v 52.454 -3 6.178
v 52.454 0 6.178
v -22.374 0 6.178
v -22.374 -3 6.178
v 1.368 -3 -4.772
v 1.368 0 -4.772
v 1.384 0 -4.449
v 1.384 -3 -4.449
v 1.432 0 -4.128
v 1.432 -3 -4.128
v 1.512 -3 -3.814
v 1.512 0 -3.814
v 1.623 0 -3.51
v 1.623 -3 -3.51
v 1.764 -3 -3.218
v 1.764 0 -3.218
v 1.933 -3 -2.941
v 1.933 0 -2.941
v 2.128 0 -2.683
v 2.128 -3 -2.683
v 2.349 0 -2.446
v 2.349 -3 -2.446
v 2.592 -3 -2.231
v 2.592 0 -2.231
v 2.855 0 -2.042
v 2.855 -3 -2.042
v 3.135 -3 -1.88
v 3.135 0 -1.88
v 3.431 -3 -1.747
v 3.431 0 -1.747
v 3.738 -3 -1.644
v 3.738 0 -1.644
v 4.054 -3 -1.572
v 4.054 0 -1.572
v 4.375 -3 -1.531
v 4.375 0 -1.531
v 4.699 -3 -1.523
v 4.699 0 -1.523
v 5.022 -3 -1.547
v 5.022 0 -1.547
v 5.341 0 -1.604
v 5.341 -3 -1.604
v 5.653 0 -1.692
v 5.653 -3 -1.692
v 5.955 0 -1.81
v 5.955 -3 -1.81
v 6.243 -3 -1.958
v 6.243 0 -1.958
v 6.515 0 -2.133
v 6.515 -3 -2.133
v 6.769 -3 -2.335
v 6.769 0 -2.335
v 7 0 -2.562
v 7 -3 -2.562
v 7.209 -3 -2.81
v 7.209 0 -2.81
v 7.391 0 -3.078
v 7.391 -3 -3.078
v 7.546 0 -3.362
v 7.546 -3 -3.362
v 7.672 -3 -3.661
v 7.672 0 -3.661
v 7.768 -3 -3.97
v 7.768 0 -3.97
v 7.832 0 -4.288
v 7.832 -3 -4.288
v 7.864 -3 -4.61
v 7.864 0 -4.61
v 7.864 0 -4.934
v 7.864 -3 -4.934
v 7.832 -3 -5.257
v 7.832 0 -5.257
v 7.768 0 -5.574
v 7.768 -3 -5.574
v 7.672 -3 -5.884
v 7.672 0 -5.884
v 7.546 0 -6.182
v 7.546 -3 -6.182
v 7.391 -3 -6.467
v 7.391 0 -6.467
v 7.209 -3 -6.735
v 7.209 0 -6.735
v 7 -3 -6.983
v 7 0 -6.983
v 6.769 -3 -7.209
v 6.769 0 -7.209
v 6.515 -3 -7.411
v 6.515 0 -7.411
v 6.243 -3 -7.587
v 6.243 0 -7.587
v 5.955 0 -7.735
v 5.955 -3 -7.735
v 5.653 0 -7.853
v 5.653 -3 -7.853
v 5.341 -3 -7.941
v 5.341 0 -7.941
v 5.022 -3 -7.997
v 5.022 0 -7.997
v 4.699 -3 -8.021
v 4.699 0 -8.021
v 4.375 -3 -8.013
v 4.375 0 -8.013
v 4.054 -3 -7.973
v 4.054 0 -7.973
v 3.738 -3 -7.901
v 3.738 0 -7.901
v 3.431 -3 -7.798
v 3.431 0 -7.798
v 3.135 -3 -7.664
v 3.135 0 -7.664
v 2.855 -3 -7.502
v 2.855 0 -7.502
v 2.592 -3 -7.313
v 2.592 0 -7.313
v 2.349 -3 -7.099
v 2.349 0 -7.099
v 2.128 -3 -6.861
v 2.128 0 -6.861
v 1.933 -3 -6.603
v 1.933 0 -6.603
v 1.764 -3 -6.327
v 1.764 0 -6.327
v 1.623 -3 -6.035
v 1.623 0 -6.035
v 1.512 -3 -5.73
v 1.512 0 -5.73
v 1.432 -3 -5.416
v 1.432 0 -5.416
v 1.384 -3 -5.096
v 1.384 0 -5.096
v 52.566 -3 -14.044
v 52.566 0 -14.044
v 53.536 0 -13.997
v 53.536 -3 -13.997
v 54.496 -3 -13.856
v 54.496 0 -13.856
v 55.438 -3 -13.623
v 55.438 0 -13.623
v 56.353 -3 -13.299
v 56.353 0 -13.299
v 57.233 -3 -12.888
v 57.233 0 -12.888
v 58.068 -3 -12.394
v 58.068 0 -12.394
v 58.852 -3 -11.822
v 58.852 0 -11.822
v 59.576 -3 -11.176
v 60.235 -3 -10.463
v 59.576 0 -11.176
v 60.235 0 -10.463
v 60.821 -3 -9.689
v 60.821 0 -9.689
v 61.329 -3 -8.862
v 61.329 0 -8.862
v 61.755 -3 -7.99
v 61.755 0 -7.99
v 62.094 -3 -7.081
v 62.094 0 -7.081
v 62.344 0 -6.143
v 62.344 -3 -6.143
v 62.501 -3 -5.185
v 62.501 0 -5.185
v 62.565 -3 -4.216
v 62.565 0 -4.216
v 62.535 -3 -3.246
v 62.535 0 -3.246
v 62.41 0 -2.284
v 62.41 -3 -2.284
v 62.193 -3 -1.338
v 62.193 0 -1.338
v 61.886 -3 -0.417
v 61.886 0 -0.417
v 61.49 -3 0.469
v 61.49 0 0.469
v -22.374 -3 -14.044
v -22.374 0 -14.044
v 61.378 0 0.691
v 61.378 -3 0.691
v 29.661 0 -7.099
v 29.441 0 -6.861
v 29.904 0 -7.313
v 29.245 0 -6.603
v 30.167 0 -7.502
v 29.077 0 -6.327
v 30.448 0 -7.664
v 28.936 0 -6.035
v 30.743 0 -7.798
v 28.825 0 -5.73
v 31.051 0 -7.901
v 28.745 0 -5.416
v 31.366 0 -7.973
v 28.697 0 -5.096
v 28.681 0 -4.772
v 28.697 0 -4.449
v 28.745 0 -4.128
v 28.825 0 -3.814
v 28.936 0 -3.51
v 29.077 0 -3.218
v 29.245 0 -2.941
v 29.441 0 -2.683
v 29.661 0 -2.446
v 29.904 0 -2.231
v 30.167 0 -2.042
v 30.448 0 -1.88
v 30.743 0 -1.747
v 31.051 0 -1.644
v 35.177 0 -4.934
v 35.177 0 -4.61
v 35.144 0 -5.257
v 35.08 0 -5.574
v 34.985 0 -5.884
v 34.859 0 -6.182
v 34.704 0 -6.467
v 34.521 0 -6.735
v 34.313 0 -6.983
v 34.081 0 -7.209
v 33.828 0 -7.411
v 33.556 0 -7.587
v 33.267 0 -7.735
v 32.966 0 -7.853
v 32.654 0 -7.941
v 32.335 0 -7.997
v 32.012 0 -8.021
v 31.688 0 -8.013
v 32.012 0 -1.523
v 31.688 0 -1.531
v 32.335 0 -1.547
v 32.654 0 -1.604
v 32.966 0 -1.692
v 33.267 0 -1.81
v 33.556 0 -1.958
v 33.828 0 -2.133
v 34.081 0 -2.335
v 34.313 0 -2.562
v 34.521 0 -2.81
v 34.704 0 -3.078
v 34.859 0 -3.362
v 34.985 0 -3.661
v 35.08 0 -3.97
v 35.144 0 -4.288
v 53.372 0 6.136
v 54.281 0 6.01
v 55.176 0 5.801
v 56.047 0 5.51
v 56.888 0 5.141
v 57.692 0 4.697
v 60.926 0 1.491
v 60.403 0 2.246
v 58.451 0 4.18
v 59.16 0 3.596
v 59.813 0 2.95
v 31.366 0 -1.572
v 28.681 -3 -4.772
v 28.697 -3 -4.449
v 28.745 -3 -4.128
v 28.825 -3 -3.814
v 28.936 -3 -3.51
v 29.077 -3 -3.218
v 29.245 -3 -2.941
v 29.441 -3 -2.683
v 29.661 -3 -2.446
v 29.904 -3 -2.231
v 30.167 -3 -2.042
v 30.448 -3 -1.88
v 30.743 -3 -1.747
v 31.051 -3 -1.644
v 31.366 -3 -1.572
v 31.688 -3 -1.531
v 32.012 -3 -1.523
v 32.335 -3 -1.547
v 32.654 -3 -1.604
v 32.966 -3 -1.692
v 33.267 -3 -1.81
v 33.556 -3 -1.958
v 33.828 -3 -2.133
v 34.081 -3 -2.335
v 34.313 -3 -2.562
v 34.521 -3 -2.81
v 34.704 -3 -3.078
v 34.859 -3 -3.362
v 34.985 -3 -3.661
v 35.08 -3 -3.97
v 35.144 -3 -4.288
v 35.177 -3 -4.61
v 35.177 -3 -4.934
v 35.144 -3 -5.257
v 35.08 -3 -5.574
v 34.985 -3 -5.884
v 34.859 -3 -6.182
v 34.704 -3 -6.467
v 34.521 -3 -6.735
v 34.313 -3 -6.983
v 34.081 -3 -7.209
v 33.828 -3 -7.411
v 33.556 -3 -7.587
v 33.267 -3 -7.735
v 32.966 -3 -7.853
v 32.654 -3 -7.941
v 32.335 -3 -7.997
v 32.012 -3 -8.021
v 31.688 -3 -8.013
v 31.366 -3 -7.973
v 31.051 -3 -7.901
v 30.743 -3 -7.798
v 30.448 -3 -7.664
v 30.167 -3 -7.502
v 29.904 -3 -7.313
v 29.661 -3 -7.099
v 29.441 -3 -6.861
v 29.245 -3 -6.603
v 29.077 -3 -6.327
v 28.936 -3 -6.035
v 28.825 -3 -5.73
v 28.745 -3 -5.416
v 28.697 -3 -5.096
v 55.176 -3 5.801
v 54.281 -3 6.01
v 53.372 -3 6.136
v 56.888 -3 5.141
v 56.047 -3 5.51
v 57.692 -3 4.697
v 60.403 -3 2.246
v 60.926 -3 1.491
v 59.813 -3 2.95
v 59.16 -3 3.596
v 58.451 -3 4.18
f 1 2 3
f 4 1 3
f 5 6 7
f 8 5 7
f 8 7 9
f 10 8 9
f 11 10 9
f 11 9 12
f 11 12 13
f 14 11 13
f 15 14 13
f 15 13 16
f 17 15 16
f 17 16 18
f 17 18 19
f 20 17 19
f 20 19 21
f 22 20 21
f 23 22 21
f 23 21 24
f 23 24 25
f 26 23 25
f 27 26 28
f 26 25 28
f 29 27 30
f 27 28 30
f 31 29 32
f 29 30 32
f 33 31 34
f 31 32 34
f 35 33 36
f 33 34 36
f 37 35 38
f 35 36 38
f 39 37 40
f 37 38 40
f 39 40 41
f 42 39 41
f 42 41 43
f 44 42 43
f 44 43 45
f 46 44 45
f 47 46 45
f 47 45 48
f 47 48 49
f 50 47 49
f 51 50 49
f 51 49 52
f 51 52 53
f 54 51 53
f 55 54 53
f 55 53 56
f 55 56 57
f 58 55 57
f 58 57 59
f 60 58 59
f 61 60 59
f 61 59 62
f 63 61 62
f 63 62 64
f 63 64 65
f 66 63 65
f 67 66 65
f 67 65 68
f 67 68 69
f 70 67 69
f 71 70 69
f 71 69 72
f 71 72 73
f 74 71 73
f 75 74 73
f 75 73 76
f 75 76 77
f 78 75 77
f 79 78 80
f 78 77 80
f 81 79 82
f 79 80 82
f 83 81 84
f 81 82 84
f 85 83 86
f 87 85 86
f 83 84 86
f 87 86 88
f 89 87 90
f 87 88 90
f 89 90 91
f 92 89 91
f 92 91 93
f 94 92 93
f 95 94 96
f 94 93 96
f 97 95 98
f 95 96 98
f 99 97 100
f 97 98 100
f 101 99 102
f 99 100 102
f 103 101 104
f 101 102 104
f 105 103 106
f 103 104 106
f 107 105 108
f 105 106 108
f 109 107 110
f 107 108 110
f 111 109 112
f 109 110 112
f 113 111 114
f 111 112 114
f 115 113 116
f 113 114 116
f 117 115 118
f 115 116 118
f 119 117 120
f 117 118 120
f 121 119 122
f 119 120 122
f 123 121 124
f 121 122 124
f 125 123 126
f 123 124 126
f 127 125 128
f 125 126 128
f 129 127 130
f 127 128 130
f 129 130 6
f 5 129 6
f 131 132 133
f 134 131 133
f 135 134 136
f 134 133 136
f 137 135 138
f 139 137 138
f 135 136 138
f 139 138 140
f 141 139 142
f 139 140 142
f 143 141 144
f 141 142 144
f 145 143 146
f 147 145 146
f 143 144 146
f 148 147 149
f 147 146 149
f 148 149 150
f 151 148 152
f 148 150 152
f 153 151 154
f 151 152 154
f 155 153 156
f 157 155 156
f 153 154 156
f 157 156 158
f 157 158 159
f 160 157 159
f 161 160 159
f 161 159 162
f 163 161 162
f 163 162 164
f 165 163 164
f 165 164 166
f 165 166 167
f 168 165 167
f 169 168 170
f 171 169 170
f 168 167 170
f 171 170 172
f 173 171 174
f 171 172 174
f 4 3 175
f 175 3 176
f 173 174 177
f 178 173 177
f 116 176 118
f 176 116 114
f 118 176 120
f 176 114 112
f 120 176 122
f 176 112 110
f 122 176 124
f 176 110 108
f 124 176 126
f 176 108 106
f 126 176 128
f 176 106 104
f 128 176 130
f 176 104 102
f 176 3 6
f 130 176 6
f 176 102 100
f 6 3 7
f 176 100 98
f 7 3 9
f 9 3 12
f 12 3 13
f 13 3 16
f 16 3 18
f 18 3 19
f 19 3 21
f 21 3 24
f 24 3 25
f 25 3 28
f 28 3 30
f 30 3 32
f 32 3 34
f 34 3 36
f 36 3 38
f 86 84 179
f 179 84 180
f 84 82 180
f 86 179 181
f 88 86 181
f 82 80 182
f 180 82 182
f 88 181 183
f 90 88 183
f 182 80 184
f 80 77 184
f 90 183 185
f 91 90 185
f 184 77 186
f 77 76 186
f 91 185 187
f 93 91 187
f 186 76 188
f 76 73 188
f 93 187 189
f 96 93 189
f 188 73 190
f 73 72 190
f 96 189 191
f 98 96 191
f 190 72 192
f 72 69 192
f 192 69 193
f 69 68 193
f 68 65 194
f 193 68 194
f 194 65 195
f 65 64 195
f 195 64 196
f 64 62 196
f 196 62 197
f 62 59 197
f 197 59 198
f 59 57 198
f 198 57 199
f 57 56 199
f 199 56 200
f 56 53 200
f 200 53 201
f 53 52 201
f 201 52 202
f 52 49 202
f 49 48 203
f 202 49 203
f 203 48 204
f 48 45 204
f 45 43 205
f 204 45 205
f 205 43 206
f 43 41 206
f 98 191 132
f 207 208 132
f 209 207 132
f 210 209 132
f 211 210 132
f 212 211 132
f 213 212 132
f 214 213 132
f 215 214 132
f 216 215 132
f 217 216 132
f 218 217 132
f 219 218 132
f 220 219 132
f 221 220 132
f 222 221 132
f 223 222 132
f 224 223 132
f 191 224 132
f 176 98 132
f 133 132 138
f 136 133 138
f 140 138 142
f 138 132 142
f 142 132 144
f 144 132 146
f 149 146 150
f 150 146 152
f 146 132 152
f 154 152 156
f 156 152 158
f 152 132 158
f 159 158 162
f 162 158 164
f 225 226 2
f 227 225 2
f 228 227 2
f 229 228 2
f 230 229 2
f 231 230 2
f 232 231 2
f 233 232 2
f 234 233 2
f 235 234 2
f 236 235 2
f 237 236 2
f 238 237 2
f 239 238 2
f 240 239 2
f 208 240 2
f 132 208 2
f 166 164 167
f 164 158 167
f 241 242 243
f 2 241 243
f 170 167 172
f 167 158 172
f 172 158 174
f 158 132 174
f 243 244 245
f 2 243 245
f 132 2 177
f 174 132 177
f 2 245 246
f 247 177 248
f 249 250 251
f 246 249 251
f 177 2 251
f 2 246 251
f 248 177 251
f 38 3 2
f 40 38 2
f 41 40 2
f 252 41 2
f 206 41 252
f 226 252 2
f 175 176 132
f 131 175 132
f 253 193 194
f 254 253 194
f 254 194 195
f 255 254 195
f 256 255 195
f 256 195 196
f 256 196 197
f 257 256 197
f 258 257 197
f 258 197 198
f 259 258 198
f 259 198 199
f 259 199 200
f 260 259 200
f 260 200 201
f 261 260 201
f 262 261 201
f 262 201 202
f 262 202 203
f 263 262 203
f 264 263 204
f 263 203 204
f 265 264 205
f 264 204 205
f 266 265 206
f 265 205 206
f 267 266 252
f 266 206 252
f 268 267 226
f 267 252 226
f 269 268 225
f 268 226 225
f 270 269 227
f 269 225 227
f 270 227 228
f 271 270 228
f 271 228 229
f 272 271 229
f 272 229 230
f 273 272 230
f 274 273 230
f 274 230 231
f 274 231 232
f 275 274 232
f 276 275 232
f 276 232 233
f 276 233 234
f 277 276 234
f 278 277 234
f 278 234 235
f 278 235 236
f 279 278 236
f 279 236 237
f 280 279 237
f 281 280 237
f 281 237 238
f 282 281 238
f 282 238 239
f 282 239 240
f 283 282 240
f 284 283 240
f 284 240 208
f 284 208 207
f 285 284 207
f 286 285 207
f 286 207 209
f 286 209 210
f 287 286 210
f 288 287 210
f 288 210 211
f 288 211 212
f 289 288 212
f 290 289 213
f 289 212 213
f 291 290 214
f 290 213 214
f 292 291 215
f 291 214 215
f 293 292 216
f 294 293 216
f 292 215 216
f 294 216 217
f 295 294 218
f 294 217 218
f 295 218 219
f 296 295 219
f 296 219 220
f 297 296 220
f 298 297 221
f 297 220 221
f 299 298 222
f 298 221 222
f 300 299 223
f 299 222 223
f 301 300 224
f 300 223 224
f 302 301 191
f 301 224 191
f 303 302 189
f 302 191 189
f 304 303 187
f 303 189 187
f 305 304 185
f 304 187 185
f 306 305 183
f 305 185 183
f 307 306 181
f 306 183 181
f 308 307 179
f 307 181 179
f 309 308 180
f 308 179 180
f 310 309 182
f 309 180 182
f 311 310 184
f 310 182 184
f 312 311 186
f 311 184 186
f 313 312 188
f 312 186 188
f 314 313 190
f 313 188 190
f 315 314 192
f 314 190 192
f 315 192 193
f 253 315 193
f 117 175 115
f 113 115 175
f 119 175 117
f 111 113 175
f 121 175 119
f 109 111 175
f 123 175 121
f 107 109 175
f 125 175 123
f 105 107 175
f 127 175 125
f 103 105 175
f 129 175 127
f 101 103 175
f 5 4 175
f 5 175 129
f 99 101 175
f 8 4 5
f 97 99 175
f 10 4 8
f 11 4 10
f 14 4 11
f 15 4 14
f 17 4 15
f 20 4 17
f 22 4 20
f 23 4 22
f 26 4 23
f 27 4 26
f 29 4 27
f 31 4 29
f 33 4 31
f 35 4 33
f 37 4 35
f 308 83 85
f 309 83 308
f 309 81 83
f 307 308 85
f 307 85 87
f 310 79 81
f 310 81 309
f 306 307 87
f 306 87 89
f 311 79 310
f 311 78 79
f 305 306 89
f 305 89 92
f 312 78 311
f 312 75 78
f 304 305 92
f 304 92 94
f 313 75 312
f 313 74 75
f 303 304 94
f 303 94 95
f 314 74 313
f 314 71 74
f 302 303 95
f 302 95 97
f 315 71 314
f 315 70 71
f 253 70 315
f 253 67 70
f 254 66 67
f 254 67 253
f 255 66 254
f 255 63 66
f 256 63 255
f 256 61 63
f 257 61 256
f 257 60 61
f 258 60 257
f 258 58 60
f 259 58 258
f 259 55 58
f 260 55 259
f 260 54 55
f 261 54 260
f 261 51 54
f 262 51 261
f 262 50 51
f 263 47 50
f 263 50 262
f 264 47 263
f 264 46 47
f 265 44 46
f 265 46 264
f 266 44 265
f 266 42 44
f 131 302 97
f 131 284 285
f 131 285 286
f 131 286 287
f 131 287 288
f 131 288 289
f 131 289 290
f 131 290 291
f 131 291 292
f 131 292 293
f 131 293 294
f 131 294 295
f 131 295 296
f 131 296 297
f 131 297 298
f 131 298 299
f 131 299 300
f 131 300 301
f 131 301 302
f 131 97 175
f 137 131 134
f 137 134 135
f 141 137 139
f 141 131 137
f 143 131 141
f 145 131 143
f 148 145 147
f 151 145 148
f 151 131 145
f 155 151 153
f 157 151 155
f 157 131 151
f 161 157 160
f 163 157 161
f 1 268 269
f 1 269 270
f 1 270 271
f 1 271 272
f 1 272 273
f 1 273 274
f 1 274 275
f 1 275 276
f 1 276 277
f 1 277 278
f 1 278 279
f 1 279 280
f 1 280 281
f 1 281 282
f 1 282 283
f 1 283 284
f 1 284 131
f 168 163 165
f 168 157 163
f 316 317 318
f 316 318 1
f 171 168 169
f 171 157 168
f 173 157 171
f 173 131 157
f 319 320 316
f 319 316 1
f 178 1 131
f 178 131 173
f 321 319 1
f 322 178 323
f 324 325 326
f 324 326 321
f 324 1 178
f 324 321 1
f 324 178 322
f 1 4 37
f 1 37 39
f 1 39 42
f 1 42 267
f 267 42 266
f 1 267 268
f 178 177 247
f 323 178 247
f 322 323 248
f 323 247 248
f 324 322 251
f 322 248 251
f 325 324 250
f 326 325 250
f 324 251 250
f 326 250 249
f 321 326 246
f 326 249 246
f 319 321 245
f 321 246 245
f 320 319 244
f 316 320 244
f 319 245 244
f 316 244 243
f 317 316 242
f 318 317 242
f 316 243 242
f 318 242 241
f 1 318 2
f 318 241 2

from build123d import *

# Parameters (mm, degrees)
F1_DEPTH       = 3
F3_D           = 3.3
F3_DEPTH       = 14.4
F3_CBORE_D     = 6.5
F3_CBORE_DEPTH = 3
F3_TIP         = 0.9914200214


with BuildPart() as f1:
    # F0 (on Front) → F1 (new body)
    with BuildSketch(Plane.XZ):
        with BuildLine():
            Line((52.4541210128, 6.1781848239), (-22.3743356764, 6.1781848239))
            Line((-22.3743356764, 6.1781848239), (-22.3743356764, -14.0438194092))
            Line((-22.3743356764, -14.0438194092), (52.5663935712, -14.0438194092))
            ThreePointArc((52.5663935712, -14.0438194092), (61.0848860922, -9.2816896986), (61.4901453485, 0.469123557))
            Line((61.4901453485, 0.469123557), (61.3778727901, 0.6911277901))
            ThreePointArc((61.3778727901, 0.6911277901), (57.6919913022, 4.696677345), (52.4541210128, 6.1781848239))
        make_face()
    extrude(amount=F1_DEPTH)

    # F3
    with Locations(Plane(origin=(0, 0, 0), x_dir=(-1, 0, 0), z_dir=(0, 1, 0))):
        with Locations((-31.9307483733, -4.7722645104), (-4.6180379577, -4.7722645104)):
            CounterBoreHole(F3_D / 2, F3_CBORE_D / 2, F3_CBORE_DEPTH, depth=F3_DEPTH)
            with Locations((0, 0, -(F3_DEPTH + F3_TIP / 2))):  # 118° drill point
                Cone(0, F3_D / 2, F3_TIP, mode=Mode.SUBTRACT)


solid = f1.part
